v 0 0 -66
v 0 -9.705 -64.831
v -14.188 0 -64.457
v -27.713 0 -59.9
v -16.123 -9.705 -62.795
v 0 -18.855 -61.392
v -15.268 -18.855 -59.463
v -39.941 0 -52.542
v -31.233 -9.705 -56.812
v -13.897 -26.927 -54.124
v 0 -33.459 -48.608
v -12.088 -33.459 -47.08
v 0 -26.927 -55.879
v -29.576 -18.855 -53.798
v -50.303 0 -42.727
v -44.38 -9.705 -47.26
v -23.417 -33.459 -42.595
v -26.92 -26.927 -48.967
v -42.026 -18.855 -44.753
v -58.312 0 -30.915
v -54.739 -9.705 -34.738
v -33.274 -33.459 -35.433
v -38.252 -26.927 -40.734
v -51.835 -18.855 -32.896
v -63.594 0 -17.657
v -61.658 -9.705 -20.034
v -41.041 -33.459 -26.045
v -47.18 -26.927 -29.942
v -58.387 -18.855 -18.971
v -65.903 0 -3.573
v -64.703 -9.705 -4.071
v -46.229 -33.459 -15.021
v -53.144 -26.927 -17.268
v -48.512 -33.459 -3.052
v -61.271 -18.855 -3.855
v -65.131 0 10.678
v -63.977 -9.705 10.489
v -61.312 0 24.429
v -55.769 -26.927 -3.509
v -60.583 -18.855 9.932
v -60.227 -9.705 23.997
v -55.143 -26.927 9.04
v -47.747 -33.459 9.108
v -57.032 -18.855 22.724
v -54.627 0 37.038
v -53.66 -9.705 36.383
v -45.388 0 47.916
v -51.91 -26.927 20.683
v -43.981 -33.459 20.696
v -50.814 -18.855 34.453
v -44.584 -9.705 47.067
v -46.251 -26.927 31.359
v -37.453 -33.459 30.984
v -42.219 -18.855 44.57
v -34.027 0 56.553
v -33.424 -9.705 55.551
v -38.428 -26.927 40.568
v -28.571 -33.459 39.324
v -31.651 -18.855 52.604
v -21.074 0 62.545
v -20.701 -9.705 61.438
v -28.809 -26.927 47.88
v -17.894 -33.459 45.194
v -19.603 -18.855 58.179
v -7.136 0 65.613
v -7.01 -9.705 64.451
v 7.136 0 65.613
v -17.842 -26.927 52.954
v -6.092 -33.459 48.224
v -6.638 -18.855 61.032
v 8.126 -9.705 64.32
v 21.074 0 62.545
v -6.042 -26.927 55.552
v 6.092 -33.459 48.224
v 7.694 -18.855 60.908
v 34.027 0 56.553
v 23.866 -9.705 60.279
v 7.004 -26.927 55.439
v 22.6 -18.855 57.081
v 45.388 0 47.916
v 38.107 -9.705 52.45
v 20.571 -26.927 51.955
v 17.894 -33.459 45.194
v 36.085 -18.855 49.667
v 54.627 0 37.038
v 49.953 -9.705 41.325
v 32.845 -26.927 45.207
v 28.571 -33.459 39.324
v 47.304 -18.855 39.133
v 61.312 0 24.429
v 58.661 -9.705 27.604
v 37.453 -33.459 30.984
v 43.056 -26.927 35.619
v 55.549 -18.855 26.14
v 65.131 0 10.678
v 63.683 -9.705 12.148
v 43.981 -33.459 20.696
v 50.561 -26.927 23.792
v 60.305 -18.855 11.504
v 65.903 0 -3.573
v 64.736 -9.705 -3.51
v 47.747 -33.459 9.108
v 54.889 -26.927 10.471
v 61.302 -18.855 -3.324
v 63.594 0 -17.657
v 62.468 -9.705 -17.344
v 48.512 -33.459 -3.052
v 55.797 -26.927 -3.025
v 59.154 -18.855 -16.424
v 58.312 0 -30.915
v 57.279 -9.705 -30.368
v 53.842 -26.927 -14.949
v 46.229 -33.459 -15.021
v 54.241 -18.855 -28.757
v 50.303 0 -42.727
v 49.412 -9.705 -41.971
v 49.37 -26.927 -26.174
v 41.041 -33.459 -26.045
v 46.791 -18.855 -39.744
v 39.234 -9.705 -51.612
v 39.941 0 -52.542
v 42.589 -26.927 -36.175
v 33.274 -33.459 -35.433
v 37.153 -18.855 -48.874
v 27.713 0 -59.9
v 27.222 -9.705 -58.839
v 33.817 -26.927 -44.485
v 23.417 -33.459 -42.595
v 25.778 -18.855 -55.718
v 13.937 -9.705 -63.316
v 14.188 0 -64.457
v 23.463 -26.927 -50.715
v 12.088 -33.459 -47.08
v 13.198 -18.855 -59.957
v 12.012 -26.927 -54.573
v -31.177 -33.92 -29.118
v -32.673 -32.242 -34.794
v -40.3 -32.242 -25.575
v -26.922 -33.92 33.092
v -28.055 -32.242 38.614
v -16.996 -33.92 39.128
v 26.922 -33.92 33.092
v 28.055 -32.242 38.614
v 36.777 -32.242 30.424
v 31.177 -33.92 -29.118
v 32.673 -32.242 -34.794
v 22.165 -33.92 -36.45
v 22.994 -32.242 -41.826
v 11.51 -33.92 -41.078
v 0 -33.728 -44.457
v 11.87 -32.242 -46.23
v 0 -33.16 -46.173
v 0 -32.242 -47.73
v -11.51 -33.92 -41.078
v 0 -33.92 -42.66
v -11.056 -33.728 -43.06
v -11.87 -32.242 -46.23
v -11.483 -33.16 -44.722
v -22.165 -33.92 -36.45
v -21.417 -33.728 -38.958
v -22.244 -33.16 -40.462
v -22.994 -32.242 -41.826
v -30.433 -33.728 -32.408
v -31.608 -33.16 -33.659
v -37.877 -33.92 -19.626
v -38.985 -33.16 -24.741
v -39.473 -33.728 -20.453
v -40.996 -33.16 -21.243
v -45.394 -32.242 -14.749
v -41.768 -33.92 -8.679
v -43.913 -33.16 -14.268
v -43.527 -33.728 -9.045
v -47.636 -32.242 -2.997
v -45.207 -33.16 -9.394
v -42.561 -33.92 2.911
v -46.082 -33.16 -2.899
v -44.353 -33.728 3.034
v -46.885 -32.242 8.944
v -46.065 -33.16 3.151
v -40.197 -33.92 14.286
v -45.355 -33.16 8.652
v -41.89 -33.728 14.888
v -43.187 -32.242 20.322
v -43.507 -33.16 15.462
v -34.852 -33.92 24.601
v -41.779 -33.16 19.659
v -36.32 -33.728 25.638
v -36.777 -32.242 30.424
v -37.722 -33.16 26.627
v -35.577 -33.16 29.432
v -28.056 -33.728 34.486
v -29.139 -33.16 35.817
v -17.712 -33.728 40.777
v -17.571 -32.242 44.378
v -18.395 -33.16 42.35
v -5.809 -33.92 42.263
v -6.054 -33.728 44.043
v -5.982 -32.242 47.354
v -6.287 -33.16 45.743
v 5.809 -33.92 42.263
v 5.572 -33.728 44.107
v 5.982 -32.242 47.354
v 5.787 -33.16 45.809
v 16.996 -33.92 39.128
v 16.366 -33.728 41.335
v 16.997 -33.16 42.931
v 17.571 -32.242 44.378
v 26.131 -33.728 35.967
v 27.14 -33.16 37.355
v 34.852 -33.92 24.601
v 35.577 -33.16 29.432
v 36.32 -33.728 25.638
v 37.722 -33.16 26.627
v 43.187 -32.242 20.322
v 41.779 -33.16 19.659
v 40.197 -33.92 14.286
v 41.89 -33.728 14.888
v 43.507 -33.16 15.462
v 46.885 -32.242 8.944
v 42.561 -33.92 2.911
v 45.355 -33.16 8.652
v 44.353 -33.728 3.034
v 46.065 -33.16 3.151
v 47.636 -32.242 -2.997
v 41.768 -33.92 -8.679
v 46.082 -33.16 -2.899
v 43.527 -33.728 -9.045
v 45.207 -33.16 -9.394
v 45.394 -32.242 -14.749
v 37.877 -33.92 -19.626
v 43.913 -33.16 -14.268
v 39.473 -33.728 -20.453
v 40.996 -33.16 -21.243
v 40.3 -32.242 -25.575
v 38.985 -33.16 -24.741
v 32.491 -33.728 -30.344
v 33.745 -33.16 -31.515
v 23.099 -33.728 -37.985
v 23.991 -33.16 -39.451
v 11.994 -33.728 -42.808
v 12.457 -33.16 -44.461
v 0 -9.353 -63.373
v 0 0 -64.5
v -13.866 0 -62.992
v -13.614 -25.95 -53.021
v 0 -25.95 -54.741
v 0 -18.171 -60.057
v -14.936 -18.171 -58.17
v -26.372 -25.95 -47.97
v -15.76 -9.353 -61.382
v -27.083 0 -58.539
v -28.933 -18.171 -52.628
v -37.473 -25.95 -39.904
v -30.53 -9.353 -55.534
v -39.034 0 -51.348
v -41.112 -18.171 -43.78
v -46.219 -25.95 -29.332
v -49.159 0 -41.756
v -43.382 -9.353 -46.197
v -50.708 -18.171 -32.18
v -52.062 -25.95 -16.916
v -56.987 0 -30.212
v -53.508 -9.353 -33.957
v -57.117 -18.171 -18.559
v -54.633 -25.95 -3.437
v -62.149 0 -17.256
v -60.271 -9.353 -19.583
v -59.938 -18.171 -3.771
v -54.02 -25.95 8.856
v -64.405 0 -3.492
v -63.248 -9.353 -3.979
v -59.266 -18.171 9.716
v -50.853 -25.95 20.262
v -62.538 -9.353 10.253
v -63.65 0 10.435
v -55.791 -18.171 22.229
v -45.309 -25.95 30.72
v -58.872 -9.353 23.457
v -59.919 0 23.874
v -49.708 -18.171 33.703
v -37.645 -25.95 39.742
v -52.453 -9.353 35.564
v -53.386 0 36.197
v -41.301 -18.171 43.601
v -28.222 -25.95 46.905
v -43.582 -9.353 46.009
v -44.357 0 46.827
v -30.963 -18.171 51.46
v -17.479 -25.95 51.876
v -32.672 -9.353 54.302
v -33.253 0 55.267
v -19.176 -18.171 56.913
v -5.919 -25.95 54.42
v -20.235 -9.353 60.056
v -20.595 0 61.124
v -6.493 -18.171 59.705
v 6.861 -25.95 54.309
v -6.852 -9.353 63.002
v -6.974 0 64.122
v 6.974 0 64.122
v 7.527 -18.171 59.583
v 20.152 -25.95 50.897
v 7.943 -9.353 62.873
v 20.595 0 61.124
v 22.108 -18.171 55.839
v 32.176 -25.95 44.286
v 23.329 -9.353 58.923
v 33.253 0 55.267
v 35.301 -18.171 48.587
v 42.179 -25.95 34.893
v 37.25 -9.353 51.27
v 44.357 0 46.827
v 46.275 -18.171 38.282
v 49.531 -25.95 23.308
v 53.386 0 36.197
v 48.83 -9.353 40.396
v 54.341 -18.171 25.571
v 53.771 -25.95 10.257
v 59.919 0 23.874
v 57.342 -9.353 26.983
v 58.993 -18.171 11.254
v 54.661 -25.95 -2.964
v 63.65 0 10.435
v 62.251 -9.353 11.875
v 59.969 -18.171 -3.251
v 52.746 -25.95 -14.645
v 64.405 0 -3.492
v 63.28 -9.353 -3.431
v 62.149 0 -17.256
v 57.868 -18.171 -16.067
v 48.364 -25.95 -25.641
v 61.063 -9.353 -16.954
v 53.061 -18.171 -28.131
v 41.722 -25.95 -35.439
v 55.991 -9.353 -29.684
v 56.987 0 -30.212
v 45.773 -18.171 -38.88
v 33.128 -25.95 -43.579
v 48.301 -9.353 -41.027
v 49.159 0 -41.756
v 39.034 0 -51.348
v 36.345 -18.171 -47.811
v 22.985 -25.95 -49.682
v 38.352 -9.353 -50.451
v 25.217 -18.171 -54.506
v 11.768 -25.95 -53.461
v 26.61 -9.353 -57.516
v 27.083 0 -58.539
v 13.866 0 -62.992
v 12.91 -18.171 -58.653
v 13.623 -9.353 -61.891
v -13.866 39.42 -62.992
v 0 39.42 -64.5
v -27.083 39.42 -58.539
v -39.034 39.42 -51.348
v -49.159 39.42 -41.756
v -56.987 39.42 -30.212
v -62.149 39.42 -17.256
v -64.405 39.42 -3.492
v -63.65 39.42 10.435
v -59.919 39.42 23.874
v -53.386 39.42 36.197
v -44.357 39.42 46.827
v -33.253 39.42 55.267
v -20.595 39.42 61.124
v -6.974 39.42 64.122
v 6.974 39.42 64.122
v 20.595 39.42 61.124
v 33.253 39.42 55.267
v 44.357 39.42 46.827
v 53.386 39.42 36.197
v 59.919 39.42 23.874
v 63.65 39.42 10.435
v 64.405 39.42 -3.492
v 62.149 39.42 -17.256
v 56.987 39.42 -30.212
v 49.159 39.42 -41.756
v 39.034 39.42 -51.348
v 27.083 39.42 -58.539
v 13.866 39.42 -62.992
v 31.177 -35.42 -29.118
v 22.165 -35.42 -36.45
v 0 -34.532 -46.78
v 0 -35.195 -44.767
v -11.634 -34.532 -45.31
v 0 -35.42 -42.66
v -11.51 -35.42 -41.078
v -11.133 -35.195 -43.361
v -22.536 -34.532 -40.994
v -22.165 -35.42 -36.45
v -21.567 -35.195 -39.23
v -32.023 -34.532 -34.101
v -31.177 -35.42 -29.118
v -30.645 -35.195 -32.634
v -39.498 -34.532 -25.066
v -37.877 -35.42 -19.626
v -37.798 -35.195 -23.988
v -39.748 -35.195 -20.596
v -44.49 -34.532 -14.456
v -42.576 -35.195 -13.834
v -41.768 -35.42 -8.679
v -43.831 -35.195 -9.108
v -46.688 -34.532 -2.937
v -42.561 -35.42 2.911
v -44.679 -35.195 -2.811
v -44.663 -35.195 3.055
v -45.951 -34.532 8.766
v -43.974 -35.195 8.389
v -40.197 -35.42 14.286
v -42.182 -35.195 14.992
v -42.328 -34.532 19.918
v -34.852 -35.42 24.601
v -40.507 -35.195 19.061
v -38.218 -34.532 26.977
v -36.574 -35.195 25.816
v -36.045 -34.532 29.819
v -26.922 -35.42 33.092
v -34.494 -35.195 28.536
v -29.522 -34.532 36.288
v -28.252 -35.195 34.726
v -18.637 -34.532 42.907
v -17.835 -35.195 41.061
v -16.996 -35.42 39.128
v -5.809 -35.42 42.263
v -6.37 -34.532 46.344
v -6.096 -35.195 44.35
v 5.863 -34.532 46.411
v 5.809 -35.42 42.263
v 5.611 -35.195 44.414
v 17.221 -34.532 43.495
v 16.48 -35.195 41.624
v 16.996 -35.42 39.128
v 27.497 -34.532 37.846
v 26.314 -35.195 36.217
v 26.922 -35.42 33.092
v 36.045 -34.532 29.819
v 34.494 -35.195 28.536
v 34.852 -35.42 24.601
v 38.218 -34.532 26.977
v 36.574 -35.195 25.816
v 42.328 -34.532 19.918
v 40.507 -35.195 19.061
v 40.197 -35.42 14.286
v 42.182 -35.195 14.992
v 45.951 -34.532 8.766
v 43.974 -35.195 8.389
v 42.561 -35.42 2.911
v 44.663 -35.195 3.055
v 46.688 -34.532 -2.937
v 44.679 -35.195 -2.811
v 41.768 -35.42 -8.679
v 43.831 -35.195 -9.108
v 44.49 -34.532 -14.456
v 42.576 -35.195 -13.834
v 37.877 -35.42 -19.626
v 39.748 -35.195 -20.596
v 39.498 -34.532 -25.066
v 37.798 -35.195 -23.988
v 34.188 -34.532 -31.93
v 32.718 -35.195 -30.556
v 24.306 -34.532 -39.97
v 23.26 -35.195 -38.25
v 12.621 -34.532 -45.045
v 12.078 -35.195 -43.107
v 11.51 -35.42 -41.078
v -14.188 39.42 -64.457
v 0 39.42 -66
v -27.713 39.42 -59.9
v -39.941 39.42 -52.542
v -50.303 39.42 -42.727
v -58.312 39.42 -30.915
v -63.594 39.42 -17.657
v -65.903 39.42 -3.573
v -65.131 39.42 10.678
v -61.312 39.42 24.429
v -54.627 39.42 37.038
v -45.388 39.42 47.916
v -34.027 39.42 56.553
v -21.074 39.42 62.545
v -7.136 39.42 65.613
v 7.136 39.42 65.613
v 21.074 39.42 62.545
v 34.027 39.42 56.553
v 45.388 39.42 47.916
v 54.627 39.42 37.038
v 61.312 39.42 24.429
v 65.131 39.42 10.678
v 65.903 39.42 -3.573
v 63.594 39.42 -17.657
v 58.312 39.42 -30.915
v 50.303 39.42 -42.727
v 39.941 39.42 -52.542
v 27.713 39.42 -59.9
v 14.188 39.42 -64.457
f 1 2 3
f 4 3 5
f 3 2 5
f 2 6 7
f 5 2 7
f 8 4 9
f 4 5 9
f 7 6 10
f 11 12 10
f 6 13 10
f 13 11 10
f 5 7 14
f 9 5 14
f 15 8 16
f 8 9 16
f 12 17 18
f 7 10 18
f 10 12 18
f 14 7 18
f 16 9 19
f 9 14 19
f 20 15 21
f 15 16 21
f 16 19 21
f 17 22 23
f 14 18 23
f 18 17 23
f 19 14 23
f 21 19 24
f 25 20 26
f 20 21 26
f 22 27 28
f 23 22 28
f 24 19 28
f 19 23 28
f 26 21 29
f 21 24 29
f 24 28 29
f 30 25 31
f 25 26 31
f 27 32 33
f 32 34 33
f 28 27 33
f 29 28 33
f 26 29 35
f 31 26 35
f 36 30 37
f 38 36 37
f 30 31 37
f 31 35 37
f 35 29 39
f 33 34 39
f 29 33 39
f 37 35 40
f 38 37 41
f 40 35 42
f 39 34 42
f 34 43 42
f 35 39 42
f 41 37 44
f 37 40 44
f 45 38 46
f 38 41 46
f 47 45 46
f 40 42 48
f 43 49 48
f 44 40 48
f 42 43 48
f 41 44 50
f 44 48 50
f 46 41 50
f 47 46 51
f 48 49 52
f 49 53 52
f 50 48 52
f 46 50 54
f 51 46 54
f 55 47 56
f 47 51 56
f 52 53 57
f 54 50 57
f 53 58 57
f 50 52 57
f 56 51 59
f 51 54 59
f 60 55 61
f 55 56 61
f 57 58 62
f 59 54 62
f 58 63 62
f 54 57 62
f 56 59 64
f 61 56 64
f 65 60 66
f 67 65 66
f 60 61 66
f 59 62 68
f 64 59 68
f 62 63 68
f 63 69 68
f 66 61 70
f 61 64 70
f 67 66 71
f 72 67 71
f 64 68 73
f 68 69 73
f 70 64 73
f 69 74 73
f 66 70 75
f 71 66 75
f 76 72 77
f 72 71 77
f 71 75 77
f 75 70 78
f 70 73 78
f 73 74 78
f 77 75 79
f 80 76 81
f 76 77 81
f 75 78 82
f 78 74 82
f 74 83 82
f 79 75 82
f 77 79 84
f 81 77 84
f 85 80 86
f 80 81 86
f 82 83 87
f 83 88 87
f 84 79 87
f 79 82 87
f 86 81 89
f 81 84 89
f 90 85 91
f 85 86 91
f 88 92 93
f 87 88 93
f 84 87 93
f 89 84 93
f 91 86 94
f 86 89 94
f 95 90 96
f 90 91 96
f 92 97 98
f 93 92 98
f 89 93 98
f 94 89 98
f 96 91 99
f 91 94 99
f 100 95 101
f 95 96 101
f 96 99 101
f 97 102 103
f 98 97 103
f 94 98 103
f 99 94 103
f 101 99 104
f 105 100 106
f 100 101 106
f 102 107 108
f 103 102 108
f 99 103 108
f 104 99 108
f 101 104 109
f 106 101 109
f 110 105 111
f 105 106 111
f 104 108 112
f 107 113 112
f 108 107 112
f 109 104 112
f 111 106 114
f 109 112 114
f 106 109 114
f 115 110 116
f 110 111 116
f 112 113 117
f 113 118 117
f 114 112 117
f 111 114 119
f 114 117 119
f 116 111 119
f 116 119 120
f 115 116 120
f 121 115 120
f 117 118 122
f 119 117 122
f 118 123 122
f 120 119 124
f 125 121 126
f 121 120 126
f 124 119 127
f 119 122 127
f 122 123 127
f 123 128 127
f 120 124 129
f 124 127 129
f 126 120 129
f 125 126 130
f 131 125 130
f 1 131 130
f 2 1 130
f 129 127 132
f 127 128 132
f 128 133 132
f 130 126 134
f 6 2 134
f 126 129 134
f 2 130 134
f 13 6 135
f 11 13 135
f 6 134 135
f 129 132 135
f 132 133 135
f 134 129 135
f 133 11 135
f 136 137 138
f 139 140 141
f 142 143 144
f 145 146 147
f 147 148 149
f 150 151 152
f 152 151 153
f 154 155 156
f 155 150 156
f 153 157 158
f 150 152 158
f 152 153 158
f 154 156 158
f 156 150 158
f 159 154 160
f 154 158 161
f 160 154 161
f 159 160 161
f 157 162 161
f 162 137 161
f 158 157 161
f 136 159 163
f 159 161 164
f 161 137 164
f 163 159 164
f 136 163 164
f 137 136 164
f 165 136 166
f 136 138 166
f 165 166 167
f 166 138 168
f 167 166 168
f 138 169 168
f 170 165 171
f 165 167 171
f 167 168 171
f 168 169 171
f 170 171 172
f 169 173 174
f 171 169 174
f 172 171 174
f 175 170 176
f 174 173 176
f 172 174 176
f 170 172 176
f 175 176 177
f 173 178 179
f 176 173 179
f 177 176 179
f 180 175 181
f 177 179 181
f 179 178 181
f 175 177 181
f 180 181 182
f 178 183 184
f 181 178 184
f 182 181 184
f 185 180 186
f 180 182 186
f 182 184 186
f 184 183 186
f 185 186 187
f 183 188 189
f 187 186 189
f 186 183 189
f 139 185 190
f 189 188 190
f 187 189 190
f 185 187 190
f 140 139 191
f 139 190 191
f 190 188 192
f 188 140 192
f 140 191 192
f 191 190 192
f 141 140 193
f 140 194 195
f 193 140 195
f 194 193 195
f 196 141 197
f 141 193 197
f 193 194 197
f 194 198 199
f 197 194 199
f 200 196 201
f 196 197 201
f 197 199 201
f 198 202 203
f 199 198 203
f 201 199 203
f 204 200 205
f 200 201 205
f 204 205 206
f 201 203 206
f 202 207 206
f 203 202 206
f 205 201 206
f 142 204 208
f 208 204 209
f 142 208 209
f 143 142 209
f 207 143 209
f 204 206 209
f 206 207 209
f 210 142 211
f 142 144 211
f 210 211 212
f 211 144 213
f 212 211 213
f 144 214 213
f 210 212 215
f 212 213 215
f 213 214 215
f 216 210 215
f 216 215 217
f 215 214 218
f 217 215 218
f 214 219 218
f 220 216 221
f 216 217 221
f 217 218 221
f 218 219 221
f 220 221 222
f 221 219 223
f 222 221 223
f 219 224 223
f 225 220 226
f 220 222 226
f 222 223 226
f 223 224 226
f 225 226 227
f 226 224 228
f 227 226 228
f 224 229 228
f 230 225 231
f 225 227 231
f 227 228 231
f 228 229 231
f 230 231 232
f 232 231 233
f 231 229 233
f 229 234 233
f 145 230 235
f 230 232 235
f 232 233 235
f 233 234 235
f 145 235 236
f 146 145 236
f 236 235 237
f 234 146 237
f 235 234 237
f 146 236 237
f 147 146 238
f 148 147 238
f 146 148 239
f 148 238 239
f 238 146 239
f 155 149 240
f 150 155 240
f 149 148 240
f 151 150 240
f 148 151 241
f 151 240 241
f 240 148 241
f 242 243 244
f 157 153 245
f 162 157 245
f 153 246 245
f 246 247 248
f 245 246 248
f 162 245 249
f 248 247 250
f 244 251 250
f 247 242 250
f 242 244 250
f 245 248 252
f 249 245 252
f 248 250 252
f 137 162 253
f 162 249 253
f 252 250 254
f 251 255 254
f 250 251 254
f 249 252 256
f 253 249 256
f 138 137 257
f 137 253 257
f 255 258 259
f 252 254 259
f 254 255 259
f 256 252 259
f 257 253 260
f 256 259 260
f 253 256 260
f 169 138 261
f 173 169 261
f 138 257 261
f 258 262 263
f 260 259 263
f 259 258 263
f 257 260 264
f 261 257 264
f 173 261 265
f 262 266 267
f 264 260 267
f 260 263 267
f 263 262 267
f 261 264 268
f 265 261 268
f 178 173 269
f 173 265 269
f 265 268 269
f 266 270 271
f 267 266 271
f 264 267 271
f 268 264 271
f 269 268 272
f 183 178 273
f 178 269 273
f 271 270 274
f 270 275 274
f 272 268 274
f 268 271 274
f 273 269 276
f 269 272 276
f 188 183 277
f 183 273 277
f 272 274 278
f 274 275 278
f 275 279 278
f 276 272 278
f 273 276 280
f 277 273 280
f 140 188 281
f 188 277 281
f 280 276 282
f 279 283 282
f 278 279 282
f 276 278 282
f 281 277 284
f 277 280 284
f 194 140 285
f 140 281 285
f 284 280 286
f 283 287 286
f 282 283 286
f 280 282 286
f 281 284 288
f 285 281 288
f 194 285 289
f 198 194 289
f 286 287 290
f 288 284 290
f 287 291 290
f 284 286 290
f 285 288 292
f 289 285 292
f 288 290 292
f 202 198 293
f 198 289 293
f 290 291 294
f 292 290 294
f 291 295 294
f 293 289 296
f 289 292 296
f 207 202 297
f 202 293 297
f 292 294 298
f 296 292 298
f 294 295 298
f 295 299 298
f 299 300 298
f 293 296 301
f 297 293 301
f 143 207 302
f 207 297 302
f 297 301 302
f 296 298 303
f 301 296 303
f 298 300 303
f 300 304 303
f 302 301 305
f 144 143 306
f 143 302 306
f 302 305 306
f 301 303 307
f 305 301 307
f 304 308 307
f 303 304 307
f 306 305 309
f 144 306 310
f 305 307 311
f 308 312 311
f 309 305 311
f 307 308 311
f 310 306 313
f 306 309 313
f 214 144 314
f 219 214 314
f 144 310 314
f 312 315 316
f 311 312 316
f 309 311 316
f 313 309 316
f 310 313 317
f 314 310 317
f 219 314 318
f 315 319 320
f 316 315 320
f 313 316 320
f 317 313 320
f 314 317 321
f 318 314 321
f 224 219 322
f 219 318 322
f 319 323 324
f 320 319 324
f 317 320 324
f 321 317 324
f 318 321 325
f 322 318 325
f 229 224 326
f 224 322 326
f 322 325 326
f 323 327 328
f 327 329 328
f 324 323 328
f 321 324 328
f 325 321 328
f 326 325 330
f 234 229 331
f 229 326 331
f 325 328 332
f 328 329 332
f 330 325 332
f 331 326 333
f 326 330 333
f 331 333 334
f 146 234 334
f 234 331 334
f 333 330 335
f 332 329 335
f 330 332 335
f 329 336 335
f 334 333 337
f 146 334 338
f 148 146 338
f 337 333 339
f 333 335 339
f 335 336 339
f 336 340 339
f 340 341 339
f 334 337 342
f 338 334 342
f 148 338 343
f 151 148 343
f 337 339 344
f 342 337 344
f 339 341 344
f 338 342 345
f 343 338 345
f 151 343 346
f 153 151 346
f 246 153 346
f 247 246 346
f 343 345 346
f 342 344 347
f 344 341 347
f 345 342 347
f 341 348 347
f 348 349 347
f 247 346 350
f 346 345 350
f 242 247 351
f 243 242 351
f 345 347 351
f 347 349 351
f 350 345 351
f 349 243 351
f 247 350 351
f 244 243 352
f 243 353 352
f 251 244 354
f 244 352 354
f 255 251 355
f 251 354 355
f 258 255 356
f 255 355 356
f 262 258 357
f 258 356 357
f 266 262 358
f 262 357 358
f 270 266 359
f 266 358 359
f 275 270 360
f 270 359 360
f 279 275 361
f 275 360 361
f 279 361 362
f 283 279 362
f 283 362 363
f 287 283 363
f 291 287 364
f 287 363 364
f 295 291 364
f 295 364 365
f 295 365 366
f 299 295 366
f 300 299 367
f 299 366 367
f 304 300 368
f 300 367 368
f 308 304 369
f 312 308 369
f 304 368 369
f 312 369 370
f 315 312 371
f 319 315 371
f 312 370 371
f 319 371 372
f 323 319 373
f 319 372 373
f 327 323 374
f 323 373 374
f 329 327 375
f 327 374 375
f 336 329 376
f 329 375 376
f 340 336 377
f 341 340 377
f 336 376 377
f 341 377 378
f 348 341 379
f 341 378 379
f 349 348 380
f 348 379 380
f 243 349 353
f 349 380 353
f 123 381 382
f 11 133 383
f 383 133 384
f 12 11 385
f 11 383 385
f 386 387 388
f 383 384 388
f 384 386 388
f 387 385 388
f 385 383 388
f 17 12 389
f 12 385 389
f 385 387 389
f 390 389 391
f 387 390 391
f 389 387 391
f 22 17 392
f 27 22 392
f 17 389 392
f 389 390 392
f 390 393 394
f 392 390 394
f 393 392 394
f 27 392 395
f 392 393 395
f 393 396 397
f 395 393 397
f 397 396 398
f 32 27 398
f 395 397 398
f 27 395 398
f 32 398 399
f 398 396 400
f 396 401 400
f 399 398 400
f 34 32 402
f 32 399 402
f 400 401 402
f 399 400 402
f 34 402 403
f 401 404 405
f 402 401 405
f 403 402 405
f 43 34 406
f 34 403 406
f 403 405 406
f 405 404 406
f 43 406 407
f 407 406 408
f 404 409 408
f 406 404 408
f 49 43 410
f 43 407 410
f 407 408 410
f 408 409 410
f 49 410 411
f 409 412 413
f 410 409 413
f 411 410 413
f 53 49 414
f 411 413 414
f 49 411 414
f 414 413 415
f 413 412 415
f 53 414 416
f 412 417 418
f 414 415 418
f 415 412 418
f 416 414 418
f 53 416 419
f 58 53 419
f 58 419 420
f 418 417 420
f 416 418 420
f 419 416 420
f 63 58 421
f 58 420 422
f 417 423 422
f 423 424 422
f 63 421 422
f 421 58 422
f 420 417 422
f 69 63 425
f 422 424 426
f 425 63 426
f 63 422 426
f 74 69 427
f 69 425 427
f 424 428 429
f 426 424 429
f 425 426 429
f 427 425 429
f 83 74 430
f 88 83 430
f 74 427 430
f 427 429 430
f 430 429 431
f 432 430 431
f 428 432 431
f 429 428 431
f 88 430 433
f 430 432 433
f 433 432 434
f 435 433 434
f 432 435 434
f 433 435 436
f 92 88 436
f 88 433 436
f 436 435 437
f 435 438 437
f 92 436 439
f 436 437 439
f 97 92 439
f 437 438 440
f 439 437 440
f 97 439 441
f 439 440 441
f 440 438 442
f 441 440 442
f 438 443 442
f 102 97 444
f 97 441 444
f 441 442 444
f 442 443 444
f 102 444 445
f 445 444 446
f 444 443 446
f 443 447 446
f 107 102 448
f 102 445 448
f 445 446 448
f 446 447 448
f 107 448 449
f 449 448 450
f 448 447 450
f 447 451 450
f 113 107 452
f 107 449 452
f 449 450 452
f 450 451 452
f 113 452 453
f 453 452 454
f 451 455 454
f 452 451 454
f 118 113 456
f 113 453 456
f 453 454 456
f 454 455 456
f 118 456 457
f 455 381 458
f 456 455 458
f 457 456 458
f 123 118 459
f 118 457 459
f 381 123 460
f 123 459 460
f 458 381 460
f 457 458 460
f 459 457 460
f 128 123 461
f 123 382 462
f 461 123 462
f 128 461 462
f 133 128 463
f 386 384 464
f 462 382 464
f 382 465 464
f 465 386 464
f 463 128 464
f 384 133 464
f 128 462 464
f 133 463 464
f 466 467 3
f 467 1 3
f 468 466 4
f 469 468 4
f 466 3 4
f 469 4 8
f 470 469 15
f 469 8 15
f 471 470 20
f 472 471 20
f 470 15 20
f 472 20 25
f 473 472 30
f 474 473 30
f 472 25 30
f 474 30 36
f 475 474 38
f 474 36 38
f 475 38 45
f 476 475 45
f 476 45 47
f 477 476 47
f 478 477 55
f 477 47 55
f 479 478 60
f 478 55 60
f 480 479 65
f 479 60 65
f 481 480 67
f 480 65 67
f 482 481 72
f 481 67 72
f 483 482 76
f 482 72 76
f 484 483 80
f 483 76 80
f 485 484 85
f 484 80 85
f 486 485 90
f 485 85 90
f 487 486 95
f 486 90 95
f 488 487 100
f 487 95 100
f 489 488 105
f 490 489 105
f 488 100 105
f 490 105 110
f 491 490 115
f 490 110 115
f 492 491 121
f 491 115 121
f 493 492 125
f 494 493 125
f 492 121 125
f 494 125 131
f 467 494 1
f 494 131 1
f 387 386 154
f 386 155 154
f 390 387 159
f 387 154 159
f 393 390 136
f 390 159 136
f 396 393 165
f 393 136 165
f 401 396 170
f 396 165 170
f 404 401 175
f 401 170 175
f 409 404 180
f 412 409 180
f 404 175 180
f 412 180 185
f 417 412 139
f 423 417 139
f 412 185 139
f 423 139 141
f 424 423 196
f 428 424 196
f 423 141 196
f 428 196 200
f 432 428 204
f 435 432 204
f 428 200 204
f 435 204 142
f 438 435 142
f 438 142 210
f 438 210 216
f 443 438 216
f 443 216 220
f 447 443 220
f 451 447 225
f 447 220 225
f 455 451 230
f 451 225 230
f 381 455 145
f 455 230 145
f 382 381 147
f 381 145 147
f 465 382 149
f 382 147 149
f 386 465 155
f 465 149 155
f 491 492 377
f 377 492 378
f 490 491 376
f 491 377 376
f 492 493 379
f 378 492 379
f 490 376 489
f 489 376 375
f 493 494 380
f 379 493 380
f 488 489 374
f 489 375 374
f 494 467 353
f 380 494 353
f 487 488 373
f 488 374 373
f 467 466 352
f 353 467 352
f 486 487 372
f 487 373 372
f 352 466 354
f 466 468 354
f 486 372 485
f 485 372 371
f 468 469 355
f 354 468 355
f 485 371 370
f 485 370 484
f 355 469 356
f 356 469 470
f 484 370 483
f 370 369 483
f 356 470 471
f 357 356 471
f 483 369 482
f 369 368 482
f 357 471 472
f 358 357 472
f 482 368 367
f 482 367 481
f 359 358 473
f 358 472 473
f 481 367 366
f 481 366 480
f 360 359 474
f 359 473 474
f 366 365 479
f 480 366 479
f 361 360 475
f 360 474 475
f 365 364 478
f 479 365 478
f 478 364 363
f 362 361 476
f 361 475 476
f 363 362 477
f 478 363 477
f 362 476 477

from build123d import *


with BuildPart() as part:
    # Çizim1 → Döndür1 (revolve)
    with BuildSketch(Plane.XY, mode=Mode.PRIVATE) as d_nd_r1_sk:
        with BuildLine():
            Line((-64.5, 0), (-64.5, 39.42))
            Line((-64.5, 39.42), (-66, 39.42))
            Line((-66, 39.42), (-66, 0))
            ThreePointArc((-66, 0), (-61.392201024, -18.85475624), (-48.607542423, -33.459075763))
            ThreePointArc((-48.607542423, -33.459075763), (-45.791233173, -34.917124766), (-42.66, -35.42))
            Line((-42.66, -35.42), (-42.66, -33.92))
            ThreePointArc((-42.66, -33.92), (-45.330140403, -33.489718101), (-47.729948316, -32.242435347))
            ThreePointArc((-47.729948316, -32.242435347), (-60.056829884, -18.171469881), (-64.5, 0))
        make_face()
    revolve(d_nd_r1_sk.sketch.rotate(Axis((0, 0, 0), (0, 1, 0)), 270), axis=Axis((0, 0, 0), (0, 1, 0)))


solid = part.part
